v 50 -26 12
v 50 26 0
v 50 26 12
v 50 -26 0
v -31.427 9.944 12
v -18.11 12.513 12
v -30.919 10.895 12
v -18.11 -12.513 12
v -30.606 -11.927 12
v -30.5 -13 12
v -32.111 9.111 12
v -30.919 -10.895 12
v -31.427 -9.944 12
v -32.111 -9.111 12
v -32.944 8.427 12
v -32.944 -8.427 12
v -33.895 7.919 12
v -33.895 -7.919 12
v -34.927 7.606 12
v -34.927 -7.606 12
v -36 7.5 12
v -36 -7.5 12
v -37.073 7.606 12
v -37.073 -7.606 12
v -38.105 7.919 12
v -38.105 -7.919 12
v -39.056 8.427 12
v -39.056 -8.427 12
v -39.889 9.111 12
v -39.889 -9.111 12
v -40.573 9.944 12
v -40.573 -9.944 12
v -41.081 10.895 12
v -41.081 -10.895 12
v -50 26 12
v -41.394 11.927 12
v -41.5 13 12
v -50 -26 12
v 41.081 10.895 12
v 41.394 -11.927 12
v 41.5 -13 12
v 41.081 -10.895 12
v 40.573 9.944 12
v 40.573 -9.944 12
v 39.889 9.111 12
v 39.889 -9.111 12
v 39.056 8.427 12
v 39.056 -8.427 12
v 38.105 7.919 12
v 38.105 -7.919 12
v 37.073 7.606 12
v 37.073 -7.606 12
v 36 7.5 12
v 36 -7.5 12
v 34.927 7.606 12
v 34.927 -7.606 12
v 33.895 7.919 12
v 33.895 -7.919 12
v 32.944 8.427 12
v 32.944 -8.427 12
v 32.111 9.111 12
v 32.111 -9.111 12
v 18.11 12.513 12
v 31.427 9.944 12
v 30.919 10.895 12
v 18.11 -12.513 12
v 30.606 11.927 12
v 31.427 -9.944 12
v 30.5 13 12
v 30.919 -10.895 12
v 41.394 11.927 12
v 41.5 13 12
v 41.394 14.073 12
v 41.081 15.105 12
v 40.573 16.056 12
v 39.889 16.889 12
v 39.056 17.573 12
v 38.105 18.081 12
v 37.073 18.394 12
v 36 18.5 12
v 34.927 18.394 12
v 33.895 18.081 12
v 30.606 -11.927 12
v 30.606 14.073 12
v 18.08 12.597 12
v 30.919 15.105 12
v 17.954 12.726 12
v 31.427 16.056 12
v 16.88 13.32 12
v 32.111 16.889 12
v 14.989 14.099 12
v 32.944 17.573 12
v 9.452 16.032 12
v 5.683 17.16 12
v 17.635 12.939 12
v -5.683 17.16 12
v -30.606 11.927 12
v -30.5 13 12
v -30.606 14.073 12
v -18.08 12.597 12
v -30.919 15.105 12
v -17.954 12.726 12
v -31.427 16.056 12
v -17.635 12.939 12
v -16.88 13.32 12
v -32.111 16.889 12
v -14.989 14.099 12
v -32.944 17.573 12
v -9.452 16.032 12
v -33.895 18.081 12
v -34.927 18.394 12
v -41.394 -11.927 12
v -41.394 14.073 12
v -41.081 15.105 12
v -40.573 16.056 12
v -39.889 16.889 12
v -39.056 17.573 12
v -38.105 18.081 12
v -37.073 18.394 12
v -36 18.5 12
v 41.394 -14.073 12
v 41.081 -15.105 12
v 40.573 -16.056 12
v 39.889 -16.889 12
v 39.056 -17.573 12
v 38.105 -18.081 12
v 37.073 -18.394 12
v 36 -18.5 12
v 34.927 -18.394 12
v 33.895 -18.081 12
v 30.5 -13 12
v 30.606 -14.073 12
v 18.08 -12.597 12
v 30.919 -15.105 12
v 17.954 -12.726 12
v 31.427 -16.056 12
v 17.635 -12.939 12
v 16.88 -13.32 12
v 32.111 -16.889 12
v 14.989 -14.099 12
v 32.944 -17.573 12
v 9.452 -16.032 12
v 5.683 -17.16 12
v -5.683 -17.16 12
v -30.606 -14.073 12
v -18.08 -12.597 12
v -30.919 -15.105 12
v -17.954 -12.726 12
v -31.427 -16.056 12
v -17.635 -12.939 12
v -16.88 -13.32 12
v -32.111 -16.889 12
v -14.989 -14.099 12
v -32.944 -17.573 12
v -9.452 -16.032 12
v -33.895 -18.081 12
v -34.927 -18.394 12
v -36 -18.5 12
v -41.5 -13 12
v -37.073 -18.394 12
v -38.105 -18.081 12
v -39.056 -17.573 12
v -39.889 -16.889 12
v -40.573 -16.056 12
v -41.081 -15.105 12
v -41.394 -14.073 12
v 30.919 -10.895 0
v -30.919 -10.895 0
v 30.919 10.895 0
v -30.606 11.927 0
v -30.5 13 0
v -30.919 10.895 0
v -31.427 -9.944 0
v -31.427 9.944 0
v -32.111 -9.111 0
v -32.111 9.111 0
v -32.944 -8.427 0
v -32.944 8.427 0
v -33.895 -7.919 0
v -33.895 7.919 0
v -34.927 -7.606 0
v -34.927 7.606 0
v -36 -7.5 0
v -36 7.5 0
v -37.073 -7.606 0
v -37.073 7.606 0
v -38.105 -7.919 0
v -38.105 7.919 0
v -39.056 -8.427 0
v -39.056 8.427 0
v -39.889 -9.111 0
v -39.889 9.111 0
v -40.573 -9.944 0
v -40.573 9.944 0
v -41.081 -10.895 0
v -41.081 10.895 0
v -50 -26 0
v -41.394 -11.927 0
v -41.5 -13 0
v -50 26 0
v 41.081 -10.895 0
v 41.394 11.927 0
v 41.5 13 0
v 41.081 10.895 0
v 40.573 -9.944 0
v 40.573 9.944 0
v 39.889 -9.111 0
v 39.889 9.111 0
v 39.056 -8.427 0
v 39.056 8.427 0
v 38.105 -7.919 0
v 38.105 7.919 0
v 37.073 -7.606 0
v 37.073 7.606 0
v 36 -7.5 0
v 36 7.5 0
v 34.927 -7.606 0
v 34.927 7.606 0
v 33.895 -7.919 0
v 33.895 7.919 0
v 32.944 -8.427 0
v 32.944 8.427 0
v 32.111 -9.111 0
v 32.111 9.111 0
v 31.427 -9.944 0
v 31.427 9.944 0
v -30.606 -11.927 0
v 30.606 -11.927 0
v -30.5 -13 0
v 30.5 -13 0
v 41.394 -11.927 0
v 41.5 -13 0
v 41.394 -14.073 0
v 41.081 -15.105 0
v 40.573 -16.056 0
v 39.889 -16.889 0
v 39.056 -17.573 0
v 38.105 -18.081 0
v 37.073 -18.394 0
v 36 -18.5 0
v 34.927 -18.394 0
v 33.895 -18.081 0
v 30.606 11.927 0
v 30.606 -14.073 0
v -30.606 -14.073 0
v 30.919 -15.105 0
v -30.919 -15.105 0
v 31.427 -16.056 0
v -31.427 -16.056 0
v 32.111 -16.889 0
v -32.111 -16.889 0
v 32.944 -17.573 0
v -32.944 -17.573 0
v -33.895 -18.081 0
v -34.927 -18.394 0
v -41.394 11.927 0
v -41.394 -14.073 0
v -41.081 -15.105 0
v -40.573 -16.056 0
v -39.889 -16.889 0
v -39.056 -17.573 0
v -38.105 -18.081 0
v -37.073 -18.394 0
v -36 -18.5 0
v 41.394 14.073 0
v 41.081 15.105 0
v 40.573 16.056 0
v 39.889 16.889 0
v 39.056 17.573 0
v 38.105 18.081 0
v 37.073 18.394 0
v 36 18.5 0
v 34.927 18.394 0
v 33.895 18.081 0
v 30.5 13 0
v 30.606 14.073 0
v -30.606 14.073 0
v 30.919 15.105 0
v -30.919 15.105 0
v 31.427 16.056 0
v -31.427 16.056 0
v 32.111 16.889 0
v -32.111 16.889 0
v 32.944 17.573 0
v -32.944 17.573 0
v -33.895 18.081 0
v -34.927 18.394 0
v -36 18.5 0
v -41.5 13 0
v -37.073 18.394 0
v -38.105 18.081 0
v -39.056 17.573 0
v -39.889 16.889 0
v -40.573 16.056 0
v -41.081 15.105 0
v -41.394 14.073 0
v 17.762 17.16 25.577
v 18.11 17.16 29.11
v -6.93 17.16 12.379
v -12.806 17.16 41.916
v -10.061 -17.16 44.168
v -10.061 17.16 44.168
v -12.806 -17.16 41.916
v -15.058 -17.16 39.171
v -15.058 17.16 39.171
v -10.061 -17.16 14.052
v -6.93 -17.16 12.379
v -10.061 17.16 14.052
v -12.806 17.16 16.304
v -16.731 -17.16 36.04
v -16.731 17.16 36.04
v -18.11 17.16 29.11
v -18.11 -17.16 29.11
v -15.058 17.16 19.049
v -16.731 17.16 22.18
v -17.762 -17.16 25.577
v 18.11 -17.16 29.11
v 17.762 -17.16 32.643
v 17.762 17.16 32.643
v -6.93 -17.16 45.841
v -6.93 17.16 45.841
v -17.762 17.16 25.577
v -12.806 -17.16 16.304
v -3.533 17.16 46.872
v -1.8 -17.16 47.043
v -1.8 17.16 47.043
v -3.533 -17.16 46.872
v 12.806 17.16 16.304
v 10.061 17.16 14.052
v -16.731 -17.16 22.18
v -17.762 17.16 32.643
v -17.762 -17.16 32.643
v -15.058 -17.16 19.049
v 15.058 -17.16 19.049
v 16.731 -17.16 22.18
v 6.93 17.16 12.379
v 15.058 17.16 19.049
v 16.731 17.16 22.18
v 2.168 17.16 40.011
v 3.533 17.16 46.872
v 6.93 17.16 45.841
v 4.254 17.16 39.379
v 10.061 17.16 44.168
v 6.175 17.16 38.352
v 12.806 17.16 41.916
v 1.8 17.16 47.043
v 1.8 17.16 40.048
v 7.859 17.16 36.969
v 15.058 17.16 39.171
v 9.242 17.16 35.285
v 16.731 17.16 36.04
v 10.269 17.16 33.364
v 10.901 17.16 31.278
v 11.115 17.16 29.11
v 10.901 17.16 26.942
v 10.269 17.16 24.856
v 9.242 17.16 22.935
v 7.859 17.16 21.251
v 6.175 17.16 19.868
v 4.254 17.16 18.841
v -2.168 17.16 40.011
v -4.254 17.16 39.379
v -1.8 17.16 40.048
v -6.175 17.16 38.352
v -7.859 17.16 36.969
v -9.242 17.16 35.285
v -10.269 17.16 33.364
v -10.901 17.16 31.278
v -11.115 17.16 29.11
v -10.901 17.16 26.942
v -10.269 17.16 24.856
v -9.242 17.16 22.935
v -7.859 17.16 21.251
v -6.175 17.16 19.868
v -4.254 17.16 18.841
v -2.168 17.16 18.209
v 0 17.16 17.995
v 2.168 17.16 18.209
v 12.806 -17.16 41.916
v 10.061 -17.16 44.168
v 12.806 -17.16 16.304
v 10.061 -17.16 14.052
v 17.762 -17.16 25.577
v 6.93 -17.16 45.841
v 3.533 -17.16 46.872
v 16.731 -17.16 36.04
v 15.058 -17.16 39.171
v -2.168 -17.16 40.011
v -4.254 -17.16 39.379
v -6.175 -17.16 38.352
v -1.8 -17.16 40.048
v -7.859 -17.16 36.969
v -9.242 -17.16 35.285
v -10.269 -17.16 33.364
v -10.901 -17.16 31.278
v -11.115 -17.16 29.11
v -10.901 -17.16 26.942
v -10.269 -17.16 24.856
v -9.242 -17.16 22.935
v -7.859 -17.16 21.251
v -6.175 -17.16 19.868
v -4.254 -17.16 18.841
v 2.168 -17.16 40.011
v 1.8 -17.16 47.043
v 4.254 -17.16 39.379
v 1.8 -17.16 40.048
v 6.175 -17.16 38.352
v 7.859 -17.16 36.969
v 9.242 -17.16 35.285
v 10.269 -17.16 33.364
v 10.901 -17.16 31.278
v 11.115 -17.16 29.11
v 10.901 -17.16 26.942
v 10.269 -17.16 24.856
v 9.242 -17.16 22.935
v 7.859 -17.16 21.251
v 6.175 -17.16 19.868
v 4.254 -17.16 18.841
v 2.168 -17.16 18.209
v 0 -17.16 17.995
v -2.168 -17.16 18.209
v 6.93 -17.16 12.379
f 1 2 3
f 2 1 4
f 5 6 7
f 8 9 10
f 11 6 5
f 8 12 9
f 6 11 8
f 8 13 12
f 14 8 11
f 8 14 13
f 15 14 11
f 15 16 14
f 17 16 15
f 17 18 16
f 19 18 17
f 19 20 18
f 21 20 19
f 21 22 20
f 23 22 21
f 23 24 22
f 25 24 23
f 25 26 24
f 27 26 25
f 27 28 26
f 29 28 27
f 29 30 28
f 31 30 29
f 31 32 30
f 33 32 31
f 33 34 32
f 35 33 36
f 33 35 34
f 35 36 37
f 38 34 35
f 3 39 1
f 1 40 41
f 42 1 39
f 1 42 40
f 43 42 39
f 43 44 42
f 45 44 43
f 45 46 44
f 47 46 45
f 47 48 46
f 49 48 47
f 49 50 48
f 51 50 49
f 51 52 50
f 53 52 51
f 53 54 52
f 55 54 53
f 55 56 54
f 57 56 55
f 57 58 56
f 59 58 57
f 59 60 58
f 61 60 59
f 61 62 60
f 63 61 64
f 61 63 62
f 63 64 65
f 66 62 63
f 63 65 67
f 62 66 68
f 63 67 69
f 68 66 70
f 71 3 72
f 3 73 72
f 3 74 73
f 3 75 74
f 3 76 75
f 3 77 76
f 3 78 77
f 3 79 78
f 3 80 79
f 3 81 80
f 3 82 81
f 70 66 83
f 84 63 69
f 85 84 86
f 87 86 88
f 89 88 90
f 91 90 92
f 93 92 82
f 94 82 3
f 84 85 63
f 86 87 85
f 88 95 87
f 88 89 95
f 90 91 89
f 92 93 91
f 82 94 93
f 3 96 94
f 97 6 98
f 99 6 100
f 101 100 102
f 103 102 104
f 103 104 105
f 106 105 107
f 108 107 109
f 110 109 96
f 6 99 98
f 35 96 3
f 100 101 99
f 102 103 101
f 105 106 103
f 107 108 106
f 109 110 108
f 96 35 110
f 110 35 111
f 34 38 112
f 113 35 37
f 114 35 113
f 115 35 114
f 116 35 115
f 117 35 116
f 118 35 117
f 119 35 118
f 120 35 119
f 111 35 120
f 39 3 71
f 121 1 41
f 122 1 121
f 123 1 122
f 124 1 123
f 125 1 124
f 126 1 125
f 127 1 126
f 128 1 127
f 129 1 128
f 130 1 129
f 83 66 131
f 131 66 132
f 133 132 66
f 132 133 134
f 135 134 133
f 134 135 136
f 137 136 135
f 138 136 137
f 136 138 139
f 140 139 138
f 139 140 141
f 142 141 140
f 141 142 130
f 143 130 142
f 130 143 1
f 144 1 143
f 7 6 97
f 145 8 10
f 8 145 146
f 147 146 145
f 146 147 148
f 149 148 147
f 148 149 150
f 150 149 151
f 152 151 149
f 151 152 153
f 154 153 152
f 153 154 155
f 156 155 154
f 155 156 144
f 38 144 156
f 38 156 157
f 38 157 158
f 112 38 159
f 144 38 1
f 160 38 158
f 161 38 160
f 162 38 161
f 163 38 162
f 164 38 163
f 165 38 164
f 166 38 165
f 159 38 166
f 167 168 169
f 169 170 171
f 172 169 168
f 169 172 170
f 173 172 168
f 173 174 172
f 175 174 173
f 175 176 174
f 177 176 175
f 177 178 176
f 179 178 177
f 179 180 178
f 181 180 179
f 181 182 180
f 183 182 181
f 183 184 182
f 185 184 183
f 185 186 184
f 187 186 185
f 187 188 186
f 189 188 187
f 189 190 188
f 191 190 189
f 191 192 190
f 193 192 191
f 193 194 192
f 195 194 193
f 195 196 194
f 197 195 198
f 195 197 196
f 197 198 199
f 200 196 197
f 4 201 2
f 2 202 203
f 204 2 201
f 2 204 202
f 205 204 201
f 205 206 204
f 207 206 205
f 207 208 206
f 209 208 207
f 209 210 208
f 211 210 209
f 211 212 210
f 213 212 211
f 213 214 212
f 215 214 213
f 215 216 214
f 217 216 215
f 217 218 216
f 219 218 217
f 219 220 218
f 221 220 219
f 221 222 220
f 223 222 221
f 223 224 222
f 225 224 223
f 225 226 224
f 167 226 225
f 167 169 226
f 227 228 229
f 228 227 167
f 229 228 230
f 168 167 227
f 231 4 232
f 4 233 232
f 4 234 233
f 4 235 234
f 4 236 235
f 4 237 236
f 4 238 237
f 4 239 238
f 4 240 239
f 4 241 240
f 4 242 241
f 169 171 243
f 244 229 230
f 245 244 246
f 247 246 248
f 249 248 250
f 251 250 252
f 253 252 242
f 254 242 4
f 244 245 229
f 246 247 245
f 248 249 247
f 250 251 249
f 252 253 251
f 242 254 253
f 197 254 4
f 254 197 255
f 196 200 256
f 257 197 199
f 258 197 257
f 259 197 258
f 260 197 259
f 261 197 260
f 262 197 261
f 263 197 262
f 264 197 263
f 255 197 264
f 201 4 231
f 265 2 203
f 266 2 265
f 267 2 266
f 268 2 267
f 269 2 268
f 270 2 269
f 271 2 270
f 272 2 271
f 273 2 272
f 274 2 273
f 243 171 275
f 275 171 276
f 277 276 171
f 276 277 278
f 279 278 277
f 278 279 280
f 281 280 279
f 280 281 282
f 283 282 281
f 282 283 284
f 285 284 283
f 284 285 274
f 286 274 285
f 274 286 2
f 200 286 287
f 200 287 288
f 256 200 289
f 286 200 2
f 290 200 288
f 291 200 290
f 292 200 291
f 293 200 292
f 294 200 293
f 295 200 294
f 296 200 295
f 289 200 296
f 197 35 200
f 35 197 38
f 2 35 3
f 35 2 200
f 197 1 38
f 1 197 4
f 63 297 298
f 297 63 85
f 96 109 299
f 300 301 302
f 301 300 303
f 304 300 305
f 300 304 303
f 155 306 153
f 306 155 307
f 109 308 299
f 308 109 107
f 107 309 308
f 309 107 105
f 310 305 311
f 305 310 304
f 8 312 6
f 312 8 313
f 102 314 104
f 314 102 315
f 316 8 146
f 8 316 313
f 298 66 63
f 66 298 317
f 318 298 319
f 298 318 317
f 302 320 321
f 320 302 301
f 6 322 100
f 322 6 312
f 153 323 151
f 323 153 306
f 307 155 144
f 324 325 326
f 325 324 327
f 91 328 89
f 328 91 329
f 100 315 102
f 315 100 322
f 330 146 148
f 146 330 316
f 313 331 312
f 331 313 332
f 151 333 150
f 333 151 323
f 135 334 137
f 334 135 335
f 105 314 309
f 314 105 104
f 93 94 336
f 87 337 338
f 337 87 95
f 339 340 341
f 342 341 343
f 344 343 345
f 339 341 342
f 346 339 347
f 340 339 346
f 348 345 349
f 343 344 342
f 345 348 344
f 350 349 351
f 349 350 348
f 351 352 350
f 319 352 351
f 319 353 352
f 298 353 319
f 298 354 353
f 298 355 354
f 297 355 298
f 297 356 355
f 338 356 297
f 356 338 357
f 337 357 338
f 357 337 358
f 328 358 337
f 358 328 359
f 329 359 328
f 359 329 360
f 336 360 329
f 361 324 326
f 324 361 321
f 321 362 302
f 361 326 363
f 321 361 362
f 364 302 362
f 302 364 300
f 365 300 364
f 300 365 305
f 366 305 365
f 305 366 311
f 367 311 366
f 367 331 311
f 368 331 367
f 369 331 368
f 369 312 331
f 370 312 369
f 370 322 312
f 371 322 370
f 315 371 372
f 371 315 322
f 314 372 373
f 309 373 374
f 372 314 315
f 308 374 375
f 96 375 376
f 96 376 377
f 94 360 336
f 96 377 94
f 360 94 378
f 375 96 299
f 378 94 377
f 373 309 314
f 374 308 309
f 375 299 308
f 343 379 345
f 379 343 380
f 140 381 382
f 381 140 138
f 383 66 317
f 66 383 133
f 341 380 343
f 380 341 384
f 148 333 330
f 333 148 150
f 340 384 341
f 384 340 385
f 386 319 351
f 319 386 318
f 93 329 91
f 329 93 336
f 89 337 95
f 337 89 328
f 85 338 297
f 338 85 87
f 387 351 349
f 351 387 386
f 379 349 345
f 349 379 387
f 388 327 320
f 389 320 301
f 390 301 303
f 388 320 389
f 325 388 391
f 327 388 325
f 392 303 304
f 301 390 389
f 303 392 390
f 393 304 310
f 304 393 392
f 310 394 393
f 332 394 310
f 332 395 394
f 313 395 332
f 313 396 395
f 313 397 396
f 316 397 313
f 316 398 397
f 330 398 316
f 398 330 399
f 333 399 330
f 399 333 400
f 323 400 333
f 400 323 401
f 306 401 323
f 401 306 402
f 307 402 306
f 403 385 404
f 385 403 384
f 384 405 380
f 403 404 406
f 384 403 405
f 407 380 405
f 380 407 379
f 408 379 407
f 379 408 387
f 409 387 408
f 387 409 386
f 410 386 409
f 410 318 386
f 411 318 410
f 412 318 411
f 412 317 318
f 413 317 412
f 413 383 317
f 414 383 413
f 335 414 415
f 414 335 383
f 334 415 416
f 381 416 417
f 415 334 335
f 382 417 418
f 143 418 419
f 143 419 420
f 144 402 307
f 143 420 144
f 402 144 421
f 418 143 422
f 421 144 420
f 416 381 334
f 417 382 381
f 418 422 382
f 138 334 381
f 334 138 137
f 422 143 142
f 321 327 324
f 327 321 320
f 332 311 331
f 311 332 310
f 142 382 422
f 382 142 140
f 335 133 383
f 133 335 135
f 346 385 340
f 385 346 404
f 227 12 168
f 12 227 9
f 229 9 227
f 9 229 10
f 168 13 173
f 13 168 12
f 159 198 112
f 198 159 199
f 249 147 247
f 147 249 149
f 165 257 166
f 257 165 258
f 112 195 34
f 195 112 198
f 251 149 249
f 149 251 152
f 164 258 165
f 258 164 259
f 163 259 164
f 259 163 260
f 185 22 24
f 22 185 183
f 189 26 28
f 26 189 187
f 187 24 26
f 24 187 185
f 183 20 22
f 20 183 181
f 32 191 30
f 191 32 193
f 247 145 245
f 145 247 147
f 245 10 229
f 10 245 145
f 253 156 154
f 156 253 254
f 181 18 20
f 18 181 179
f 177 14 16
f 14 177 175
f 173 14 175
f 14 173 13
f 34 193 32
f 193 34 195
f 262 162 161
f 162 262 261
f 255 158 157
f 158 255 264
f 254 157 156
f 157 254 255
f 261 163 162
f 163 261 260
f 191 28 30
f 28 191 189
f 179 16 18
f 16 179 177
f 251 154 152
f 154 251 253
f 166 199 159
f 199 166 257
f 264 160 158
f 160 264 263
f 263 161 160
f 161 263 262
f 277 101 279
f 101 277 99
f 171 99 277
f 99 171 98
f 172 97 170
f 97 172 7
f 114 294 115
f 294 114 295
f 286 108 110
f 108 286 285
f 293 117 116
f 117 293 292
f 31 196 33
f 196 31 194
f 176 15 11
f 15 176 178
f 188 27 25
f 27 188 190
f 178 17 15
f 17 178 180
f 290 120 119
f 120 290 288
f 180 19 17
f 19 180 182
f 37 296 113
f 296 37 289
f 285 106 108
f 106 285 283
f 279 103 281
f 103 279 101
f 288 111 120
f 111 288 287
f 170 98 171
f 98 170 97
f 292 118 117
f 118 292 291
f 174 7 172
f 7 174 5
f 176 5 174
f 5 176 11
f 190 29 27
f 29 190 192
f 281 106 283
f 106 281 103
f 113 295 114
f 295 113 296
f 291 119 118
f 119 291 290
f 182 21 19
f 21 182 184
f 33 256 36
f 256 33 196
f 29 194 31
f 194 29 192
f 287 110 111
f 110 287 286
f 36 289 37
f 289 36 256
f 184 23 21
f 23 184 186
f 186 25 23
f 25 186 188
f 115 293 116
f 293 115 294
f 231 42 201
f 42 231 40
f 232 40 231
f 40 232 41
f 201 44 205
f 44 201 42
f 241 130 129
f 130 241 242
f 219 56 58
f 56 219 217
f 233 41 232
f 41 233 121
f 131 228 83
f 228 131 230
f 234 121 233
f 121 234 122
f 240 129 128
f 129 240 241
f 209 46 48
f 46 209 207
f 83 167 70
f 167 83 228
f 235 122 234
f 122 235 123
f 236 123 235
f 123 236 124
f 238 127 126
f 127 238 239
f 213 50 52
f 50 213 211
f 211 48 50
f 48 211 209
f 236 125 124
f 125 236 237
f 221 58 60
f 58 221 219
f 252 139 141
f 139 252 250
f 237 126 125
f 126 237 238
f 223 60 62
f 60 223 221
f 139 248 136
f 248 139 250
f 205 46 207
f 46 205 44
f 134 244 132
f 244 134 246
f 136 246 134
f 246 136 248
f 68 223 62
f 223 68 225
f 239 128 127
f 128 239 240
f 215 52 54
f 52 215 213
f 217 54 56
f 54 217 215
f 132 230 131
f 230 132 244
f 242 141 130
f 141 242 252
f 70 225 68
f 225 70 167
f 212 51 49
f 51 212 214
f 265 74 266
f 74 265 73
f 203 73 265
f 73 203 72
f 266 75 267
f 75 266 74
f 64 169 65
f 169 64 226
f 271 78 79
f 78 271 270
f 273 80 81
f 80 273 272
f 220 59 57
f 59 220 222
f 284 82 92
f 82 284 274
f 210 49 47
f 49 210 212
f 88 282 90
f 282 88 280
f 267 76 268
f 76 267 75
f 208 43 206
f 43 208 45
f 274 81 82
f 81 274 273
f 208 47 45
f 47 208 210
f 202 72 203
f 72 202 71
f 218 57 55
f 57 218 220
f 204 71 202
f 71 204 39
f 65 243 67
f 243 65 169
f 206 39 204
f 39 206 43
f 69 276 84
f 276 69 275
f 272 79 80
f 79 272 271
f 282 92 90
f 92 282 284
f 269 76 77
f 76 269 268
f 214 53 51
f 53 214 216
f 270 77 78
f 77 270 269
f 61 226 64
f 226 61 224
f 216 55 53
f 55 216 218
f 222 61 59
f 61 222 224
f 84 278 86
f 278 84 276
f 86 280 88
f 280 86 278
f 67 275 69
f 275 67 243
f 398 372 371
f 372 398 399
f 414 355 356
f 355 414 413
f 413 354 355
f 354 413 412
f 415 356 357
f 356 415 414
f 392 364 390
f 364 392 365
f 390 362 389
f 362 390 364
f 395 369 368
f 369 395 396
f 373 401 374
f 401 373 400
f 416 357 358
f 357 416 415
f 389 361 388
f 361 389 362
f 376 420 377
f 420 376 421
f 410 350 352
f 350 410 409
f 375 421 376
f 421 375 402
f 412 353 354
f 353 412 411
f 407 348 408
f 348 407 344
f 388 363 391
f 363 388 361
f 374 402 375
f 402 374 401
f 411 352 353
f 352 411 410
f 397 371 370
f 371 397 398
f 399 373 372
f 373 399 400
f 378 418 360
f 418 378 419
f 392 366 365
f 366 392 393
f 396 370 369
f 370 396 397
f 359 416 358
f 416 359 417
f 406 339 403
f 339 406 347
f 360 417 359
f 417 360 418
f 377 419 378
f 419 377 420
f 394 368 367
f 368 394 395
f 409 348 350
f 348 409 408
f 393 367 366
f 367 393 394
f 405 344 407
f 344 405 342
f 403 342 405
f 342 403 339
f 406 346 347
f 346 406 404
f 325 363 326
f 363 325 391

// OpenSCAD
$fn = 32;

// ----------------------------------------------------------------------
// Bearing block: 100 x 52 mm base, 22.23 mm bore at 29.11 mm
// ----------------------------------------------------------------------

// --- parameters (mm) ---
base_w = 100;             // base width
base_d = 52;              // base depth
base_t = 12;              // base thickness
bore_d = 22.23;           // shaft / bearing bore
house_r = 18.11;          // housing outer radius
house_len = 34.32;        // housing length along the shaft
foot_w = 36.22;           // foot width under the housing
foot_len = 24.32;         // foot length along the shaft
axis_z = 29.11;           // bore axis height above the base
holes_d = 11;             // mounting holes
hole_x = 36;              // mounting hole spacing
groove_w = 3.6;           // oil groove width

difference() {
  union() {
    /* base plate with its underside on z = 0 */
    translate([0, 0, base_t / 2]) cube([base_w, base_d, base_t], center = true);
    /* hull foot: a straight web blending into the round housing */
    hull() {
      translate([0, 0, base_t - 0.5]) cube([foot_w, foot_len, 1.6], center = true);
      translate([0, 0, axis_z]) rotate([-90, 0, 0]) cylinder(h = house_len, d = 2 * house_r, center = true);
    }
  }
  /* bore through the housing, 2.5 mm clear on both sides */
  translate([0, 0, axis_z]) rotate([-90, 0, 0]) cylinder(h = house_len + 5, d = bore_d, center = true);
  /* oil groove from the top of the housing into the bore */
  translate([-groove_w / 2, -house_len / 2 - 2.5, axis_z + bore_d * 0.17]) cube([groove_w, house_len + 5, house_r + 5]);
  /* mounting holes through the base plate */
  for (hx = [-36, 36]) {
    for (hy = [-13, 13]) {
      translate([hx, hy, -2.5]) cylinder(h = base_t + 5, d = holes_d);
    }
  }
}
